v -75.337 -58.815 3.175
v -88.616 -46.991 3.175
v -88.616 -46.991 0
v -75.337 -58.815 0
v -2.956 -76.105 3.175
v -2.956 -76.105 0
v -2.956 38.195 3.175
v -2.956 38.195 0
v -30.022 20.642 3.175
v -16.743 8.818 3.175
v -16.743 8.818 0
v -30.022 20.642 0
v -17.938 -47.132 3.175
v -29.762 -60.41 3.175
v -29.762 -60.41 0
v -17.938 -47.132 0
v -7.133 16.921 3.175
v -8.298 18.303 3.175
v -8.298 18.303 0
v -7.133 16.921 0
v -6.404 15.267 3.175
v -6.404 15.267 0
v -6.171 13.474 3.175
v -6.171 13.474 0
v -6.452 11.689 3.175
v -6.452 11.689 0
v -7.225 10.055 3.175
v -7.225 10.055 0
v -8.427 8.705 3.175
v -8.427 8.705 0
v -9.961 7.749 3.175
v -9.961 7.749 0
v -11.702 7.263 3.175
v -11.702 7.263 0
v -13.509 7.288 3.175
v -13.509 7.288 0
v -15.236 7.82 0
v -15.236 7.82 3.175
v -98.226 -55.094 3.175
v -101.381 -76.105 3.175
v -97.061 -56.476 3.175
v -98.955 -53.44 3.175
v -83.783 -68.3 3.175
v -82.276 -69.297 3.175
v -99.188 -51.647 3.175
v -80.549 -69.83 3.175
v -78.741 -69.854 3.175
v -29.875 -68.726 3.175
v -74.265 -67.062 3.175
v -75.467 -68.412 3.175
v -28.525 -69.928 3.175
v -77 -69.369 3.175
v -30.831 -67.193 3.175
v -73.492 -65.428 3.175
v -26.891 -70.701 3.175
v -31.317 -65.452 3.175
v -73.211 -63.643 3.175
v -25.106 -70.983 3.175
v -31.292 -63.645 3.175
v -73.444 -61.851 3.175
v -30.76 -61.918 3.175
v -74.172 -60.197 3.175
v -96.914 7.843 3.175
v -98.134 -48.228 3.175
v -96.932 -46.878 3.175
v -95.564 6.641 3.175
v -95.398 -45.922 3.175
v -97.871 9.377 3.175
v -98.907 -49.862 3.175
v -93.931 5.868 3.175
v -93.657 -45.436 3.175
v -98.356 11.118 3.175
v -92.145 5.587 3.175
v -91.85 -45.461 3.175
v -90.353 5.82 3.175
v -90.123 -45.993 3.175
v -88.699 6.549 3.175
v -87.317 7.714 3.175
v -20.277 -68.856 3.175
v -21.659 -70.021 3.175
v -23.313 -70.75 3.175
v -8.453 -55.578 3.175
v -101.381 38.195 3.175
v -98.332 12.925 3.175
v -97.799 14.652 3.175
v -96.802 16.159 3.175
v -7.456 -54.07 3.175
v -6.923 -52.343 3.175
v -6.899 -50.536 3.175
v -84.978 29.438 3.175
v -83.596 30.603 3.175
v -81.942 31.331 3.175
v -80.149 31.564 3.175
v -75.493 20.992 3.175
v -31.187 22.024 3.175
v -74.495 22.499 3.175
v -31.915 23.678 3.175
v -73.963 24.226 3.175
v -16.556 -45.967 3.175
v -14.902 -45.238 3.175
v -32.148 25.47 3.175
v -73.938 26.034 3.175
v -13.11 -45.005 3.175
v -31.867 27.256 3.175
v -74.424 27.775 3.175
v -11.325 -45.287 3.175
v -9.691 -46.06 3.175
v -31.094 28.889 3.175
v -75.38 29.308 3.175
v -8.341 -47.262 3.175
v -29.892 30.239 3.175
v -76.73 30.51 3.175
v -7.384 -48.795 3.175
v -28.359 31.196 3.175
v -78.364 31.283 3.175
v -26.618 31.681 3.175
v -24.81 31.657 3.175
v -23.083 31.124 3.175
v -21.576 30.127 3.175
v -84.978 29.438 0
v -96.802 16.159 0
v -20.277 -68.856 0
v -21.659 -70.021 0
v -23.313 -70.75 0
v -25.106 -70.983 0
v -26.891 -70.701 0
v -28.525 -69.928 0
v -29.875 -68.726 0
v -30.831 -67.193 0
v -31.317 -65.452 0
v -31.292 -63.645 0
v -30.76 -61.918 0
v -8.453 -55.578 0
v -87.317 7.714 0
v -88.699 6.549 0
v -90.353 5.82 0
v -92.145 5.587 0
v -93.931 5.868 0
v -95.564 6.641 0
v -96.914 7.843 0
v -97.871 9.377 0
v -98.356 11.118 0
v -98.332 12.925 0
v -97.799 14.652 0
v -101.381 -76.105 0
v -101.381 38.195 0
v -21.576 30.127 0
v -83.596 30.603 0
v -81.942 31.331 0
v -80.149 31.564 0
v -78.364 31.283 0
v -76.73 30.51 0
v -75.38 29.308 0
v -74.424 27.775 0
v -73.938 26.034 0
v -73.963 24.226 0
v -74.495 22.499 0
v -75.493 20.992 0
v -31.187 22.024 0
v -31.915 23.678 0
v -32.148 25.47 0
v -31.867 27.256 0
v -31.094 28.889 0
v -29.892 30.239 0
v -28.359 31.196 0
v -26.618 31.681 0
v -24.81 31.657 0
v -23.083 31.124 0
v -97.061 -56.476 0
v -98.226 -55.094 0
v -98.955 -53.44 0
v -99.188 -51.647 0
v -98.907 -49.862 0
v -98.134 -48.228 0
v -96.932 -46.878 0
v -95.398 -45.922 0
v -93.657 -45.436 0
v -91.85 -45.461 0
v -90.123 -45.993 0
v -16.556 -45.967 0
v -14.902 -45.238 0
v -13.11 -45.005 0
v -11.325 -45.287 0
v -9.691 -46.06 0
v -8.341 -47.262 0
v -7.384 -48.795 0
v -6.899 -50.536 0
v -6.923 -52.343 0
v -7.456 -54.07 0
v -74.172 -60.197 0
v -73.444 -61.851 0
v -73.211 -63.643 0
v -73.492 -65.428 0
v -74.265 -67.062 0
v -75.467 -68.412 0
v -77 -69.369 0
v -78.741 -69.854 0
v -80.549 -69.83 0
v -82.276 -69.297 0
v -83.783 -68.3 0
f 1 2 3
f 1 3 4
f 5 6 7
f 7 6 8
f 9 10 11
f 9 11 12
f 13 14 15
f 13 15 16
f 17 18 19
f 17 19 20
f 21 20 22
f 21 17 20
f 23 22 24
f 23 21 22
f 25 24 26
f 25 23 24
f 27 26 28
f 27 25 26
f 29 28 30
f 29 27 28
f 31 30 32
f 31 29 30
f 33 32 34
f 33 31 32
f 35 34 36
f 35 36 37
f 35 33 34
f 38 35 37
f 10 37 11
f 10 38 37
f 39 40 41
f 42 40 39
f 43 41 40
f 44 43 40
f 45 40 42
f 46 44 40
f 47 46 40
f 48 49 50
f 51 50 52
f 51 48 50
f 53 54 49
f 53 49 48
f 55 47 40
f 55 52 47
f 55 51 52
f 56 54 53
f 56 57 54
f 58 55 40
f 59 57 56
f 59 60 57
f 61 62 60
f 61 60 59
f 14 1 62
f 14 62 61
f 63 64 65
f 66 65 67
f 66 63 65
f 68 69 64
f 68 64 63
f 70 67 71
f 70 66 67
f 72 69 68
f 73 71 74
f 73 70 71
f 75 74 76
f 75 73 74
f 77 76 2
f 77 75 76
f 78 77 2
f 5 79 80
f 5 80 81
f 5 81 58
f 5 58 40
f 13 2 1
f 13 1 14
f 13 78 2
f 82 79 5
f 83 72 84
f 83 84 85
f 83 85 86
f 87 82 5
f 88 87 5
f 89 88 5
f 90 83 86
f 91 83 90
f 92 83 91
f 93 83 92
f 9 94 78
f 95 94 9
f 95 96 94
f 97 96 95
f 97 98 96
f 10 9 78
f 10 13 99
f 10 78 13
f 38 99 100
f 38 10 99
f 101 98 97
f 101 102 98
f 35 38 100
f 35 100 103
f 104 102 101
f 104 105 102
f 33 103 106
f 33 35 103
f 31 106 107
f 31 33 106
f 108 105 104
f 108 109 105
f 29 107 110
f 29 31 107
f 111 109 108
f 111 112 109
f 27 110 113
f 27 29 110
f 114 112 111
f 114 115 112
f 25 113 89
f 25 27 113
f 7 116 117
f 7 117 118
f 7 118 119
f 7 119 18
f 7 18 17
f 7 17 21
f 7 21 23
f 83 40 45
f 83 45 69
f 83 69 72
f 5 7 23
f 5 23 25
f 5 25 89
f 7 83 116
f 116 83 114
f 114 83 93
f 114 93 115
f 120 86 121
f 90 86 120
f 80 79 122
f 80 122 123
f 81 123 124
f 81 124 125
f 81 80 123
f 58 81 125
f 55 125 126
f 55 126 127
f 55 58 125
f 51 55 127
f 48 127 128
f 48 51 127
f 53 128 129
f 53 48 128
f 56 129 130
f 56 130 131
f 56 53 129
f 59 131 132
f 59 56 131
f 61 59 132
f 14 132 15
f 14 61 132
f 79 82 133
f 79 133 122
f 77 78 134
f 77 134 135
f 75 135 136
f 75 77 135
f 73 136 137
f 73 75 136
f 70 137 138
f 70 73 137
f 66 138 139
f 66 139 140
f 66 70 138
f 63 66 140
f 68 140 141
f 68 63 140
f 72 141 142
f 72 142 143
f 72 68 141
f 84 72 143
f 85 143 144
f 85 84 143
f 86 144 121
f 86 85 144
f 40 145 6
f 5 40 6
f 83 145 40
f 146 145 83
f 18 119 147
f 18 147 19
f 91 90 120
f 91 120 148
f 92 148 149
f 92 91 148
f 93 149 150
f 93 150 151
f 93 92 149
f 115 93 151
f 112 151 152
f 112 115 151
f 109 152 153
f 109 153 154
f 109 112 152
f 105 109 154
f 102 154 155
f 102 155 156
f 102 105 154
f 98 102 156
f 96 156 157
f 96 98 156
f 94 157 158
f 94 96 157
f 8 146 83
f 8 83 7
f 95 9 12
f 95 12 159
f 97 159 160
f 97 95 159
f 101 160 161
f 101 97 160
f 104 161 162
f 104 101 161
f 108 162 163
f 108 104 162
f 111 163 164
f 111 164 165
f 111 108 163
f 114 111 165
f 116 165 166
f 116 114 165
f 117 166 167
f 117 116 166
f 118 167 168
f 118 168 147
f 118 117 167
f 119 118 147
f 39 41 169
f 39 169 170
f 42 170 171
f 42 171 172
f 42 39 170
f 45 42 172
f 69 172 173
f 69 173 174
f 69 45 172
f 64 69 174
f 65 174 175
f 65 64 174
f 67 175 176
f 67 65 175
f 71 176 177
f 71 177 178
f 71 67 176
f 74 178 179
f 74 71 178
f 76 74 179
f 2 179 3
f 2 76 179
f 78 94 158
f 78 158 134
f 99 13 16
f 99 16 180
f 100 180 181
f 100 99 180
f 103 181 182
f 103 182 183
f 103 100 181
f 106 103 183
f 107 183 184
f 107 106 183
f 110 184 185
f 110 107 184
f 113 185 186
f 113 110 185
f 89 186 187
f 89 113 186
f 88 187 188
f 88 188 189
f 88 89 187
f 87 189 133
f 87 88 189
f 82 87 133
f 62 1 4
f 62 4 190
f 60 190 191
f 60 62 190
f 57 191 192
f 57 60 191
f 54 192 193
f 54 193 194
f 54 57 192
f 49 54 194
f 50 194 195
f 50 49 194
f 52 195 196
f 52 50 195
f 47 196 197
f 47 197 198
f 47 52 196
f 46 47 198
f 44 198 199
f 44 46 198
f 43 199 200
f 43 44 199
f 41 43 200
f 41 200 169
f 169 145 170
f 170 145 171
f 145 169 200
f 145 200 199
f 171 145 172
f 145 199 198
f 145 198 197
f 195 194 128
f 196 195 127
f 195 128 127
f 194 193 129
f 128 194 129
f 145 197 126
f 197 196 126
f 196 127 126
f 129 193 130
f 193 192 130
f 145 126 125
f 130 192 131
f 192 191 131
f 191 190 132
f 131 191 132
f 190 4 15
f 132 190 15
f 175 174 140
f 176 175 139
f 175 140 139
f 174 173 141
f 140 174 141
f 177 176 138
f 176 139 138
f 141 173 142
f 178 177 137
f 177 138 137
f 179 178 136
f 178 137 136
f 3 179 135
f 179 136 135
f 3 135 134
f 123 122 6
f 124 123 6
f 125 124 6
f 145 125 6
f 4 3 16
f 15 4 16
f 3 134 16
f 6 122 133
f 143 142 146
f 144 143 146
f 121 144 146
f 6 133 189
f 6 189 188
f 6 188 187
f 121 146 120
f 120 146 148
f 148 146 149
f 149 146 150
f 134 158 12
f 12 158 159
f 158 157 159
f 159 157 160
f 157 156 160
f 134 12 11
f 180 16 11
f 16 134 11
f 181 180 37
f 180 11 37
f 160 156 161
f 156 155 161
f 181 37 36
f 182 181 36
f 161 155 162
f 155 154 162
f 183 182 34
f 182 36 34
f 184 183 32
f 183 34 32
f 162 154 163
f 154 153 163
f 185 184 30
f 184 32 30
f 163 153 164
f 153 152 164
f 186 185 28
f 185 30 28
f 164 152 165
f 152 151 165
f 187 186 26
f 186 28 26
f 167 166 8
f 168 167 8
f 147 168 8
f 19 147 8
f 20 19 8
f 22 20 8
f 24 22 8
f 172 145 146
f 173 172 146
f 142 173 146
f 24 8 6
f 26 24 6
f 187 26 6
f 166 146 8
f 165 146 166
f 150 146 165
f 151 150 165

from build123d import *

# Parameters (mm, degrees)
FLAT_PLATE_W       = 98.425
FLAT_PLATE_H       = 114.3
CASTOR_PLATE_DEPTH = 3.175
CUT_EXTRUDE1_DEPTH = 3.175


with BuildPart() as part:
    # Flat Plate → Castor Plate (new body)
    with BuildSketch(Plane.XY):
        with Locations((-52.168585316, -18.955051946)):
            Rectangle(FLAT_PLATE_W, FLAT_PLATE_H)
    extrude(amount=CASTOR_PLATE_DEPTH)

    # Holes → Cut-Extrude1 (cut)
    with BuildSketch(Plane.XY.offset(3.175)):
        with BuildLine():
            Line((-96.801649102, 16.159330585), (-84.977633144, 29.437924132))
            ThreePointArc((-84.977633144, 29.437924132), (-76.012415463, 29.957416129), (-75.492923466, 20.992198448))
            Line((-75.492923466, 20.992198448), (-87.316939425, 7.7136049))
            ThreePointArc((-87.316939425, 7.7136049), (-96.282157106, 7.194112904), (-96.801649102, 16.159330585))
        make_face()
        with BuildLine():
            Line((-29.762145467, -60.410465456), (-17.938129508, -47.131871908))
            ThreePointArc((-17.938129508, -47.131871908), (-8.972911827, -46.612379911), (-8.453419831, -55.577597592))
            Line((-8.453419831, -55.577597592), (-20.27743579, -68.85619114))
            ThreePointArc((-20.27743579, -68.85619114), (-29.242653471, -69.375683136), (-29.762145467, -60.410465456))
        make_face()
        with BuildLine():
            Line((-88.615669415, -46.990896649), (-75.337075868, -58.814912608))
            ThreePointArc((-75.337075868, -58.814912608), (-74.817583871, -67.780130289), (-83.782801552, -68.299622285))
            Line((-83.782801552, -68.299622285), (-97.0613951, -56.475606326))
            ThreePointArc((-97.0613951, -56.475606326), (-97.580887096, -47.510388645), (-88.615669415, -46.990896649))
        make_face()
        with BuildLine():
            Line((-21.57616578, 30.126649102), (-8.297572232, 18.302633144))
            ThreePointArc((-8.297572232, 18.302633144), (-7.778080236, 9.337415463), (-16.743297917, 8.817923466))
            Line((-16.743297917, 8.817923466), (-30.021891465, 20.641939425))
            ThreePointArc((-30.021891465, 20.641939425), (-30.541383461, 29.607157106), (-21.57616578, 30.126649102))
        make_face()
    extrude(amount=-CUT_EXTRUDE1_DEPTH, mode=Mode.SUBTRACT)


solid = part.part
